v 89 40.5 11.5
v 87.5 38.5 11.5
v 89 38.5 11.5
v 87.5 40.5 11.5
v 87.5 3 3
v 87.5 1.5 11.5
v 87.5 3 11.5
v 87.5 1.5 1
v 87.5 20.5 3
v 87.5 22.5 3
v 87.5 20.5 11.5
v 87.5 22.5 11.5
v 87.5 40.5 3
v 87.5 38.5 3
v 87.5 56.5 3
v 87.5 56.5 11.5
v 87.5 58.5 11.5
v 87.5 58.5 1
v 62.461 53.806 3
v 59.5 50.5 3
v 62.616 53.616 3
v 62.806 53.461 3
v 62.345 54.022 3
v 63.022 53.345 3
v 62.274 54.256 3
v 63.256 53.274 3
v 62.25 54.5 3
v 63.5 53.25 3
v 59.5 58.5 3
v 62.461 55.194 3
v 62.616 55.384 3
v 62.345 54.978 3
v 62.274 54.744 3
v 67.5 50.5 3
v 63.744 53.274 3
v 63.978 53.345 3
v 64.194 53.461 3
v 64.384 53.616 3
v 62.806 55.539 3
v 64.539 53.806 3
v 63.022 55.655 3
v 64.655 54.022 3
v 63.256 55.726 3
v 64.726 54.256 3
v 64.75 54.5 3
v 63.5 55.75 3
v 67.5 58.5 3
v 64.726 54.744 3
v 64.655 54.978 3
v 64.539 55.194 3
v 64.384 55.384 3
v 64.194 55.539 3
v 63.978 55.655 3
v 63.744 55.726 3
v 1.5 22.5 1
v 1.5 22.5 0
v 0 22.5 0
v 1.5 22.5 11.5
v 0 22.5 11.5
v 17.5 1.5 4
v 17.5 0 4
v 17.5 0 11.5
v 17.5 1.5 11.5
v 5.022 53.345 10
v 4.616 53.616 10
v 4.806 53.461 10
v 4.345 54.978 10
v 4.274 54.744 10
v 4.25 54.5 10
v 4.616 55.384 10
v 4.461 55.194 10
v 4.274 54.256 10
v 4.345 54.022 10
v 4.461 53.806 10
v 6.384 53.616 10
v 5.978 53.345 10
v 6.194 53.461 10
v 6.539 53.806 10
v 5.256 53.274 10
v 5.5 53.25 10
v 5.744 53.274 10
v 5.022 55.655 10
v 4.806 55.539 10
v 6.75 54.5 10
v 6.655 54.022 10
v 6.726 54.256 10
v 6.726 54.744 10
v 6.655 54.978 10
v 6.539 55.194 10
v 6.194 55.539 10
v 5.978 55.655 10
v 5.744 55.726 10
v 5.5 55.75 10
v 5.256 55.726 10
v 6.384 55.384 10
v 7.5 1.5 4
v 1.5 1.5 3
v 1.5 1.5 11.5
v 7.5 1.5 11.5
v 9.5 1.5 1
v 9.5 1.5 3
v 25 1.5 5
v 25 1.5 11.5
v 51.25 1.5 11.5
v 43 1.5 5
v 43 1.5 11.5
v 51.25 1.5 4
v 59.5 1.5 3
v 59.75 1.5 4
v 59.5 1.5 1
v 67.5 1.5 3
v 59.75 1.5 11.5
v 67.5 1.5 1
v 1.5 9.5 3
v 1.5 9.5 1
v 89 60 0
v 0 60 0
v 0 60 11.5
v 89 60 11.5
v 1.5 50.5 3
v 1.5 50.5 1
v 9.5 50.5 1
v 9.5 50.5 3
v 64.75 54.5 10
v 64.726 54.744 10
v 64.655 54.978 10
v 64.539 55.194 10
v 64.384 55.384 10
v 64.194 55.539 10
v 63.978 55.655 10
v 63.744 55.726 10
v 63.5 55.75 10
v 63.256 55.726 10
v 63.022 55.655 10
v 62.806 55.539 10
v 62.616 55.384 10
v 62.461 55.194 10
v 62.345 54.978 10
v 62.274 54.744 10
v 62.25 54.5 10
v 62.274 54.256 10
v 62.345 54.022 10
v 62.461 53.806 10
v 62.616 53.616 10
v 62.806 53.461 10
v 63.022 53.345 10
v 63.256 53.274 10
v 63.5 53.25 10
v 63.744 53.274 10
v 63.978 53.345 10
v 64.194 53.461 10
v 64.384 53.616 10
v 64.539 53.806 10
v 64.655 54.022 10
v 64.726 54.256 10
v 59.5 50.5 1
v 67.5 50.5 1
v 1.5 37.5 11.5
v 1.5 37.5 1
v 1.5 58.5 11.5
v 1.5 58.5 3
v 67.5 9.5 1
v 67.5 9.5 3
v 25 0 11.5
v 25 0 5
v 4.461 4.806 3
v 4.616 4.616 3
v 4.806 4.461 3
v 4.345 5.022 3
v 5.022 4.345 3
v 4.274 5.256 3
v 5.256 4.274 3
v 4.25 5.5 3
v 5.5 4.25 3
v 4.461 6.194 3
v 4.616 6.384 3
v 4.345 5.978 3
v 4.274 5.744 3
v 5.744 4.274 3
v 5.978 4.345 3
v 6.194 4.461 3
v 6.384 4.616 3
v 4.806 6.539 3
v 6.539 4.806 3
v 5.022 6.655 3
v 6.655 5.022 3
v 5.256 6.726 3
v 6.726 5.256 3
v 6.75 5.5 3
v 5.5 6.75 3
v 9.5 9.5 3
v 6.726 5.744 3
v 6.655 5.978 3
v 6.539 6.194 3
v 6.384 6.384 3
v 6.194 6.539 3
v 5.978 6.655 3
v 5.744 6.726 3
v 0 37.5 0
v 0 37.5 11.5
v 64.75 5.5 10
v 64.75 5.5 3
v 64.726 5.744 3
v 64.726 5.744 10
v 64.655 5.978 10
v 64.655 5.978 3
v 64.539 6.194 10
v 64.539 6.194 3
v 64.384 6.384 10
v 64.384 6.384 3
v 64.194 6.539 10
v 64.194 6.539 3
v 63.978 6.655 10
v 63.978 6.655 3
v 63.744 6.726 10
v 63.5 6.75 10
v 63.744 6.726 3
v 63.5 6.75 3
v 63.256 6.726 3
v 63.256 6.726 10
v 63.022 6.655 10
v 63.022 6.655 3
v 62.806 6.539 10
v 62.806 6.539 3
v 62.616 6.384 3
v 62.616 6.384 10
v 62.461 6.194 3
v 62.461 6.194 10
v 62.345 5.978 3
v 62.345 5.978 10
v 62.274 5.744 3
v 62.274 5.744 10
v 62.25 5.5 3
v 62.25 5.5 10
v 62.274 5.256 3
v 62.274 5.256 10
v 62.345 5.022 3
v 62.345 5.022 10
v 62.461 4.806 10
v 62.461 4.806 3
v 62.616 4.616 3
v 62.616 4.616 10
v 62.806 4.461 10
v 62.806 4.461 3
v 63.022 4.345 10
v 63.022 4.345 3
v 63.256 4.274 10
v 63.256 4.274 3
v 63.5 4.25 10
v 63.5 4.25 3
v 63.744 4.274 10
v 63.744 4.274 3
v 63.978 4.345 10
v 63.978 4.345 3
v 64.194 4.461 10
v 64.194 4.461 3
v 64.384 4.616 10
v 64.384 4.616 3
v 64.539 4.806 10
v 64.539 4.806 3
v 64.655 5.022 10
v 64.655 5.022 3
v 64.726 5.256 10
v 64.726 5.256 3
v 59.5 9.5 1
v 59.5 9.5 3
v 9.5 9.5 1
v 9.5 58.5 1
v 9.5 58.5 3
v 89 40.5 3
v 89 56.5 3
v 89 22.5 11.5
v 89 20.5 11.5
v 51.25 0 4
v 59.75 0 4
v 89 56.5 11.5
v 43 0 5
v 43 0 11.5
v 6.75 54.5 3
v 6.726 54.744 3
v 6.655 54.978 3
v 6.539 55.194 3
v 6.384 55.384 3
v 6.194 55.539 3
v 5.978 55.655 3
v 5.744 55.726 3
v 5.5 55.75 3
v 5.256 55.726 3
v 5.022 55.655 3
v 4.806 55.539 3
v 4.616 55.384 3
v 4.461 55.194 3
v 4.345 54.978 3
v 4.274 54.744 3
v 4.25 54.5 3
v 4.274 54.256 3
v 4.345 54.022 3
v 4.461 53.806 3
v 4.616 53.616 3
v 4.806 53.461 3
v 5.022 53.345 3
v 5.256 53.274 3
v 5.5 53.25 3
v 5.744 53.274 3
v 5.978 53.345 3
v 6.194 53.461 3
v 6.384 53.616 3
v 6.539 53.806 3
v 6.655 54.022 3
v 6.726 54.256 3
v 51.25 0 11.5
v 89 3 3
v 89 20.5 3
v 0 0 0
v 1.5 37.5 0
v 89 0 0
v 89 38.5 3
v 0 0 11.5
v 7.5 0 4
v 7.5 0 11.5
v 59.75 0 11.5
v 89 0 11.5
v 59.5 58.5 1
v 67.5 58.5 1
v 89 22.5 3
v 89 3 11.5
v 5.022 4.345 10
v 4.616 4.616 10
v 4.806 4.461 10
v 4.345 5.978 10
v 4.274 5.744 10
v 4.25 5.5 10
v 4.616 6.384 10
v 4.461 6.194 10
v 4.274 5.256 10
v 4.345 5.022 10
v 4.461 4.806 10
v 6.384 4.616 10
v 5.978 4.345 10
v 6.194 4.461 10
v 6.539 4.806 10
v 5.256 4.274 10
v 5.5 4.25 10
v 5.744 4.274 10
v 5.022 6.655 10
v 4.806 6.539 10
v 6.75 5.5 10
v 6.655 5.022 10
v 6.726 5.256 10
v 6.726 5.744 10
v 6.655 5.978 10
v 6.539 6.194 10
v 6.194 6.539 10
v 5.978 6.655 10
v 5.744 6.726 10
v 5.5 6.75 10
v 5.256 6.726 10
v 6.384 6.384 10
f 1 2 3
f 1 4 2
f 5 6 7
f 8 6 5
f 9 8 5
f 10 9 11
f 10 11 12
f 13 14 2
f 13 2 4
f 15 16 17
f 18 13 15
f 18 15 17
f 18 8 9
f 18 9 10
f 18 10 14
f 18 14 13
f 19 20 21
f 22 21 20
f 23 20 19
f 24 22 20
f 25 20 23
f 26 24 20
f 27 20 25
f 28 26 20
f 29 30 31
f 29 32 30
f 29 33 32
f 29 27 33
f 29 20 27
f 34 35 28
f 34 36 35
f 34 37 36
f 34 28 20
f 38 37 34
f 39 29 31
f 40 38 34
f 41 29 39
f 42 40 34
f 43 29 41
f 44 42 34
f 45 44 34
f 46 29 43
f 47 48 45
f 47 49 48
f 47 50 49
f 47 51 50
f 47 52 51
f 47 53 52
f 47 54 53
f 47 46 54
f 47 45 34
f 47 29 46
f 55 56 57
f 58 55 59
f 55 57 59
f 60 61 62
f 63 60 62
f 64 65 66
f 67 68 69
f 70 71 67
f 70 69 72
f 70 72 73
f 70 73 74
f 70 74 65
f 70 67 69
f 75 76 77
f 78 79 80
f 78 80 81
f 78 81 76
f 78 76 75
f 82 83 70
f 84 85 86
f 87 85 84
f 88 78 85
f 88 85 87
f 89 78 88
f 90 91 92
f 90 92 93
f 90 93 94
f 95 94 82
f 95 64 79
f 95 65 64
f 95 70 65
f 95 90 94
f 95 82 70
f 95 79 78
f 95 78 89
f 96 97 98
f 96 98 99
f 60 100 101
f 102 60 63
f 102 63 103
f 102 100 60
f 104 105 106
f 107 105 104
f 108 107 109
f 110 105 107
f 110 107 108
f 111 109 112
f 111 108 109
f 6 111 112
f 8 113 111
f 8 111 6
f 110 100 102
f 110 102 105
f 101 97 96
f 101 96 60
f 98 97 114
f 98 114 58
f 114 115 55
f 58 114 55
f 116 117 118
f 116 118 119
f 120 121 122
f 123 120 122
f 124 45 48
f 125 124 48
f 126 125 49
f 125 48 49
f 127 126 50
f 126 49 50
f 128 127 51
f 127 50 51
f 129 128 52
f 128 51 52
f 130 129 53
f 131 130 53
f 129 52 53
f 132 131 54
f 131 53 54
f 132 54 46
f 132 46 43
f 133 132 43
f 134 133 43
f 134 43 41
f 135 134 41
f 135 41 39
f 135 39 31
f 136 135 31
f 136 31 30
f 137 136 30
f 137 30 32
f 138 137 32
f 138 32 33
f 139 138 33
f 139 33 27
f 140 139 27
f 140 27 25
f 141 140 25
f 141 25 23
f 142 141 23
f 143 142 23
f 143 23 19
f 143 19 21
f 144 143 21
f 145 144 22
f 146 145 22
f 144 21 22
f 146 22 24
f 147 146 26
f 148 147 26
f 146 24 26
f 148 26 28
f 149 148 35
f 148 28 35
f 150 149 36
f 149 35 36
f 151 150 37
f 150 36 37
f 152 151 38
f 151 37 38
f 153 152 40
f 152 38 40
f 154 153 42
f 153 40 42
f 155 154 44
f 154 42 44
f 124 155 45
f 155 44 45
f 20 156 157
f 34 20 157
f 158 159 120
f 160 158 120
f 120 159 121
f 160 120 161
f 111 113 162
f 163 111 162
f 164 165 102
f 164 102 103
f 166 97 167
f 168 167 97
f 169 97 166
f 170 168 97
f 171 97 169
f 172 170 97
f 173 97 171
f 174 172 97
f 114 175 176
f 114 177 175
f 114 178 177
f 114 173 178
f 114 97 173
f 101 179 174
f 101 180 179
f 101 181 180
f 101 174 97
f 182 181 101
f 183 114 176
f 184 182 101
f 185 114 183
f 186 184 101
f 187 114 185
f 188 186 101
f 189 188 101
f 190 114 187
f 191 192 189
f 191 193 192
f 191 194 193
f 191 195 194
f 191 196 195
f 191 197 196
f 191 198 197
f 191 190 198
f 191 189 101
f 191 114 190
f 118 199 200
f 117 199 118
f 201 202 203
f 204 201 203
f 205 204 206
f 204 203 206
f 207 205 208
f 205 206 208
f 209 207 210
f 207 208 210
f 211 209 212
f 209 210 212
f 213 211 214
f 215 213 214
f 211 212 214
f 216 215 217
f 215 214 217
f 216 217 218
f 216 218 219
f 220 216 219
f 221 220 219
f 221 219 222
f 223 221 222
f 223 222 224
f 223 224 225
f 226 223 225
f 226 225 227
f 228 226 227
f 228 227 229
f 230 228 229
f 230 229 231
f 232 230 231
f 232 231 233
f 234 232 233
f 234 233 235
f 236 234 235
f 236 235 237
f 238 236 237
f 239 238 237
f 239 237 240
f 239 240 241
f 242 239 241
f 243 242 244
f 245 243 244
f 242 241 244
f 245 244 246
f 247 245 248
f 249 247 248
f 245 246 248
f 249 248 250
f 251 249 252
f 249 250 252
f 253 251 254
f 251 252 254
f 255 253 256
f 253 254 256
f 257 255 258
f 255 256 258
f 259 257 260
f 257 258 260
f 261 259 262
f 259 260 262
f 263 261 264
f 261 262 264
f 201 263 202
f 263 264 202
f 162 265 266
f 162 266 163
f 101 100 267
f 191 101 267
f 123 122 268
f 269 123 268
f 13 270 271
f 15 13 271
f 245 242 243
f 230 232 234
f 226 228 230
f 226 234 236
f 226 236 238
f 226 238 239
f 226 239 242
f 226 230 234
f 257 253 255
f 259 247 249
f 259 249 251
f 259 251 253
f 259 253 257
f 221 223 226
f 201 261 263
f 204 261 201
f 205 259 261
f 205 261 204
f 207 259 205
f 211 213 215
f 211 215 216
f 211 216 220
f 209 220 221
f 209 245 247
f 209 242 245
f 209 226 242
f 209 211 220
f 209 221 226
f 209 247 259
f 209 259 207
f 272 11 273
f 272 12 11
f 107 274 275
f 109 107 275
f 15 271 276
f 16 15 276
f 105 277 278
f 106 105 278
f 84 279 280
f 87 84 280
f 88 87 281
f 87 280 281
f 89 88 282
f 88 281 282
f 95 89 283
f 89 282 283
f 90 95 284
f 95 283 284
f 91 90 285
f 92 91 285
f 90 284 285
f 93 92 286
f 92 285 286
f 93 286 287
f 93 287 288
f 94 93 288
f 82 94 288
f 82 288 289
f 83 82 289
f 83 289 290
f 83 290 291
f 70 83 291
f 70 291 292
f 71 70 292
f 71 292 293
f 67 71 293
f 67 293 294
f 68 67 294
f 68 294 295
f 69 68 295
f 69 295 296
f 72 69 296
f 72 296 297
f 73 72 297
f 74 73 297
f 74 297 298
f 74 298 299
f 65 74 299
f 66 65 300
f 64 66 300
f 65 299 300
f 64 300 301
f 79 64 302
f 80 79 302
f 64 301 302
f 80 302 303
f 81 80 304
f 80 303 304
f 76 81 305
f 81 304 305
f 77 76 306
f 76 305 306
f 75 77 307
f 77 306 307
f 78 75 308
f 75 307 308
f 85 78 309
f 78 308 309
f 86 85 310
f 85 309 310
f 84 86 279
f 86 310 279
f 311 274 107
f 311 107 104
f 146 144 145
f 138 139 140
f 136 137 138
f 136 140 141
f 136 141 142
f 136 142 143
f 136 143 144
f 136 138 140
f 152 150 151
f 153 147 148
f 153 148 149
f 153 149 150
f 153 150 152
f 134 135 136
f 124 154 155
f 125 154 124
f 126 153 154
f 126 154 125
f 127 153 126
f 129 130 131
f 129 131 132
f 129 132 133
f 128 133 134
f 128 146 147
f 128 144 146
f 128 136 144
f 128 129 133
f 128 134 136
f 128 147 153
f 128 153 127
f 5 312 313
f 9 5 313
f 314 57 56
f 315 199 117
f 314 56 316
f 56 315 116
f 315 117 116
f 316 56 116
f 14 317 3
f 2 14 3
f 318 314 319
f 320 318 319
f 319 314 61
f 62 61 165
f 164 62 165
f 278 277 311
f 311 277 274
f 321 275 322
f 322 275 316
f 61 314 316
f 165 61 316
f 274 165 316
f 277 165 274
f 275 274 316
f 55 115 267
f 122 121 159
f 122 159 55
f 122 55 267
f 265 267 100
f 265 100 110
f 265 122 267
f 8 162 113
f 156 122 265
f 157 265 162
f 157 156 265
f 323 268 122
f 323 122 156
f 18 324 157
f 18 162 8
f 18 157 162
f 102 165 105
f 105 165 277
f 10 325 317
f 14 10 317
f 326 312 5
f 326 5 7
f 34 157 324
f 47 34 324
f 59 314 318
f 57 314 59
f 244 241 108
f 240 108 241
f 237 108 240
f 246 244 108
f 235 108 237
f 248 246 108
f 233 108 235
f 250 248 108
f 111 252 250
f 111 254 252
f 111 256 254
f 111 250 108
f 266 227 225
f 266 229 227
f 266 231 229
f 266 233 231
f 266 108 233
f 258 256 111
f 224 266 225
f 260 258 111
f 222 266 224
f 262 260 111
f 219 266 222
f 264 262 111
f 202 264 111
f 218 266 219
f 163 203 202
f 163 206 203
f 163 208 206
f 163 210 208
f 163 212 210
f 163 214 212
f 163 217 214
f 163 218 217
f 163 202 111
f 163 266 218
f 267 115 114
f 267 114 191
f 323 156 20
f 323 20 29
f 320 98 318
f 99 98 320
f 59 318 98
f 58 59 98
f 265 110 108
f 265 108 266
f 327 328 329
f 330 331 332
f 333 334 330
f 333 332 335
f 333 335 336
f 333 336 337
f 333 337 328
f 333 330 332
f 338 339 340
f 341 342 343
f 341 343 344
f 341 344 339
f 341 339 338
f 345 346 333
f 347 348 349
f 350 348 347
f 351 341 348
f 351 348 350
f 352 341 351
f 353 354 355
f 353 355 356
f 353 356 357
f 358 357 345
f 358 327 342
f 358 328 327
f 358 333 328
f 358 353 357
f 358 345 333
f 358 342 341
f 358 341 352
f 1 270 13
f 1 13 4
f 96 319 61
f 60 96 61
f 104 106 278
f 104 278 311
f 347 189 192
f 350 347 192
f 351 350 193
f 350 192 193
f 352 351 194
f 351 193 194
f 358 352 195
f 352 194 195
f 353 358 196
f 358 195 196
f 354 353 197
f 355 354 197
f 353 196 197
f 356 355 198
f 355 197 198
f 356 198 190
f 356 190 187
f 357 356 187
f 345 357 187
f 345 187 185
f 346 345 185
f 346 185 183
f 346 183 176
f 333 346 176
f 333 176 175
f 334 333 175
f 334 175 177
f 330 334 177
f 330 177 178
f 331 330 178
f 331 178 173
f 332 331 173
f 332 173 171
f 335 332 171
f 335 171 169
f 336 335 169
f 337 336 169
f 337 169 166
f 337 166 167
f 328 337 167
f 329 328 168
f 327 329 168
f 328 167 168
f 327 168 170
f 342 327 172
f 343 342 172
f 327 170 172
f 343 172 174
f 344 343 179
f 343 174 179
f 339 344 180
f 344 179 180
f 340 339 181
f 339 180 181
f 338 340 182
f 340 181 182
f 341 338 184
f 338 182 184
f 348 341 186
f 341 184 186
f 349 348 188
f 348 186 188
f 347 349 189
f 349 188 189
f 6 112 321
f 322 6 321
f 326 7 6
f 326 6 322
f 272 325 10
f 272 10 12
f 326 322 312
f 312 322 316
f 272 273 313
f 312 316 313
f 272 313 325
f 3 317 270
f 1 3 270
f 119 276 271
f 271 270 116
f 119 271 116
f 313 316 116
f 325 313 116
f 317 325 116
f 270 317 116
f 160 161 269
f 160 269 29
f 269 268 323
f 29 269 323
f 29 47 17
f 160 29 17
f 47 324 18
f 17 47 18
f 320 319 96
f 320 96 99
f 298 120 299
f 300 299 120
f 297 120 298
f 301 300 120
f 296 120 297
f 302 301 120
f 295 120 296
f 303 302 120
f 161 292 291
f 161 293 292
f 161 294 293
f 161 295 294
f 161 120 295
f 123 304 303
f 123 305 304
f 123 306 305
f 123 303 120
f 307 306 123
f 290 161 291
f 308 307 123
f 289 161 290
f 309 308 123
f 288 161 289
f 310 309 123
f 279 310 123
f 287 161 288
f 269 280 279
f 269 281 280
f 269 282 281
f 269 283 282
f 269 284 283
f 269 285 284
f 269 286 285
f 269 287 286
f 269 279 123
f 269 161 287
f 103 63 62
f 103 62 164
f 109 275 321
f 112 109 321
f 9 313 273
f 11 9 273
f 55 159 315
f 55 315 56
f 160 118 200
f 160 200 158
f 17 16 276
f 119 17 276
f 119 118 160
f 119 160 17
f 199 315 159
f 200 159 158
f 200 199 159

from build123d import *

# Parameters (mm, degrees)
F0_W      = 89
F0_H      = 60
F1_DEPTH  = 1
F2_W      = 89
F2_H      = 60
F2_W_2    = 86
F2_H_2    = 57
F3_DEPTH  = 10.5
F4_W      = 15
F4_H      = 11.5
F5_DEPTH  = 1.5
F6_W      = 10
F6_H      = 7.5
F6_W_2    = 18
F6_H_2    = 6.5
F6_W_3    = 8.5
F7_DEPTH  = 1.5
F8_W      = 17.5
F8_H      = 8.5
F8_W_2    = 16
F9_DEPTH  = 1.5
F10_R     = 1.25
F11_DEPTH = 9
F12_W     = 8
F12_H     = 8
F12_R     = 1.25
F13_DEPTH = 2


with BuildPart() as f1:
    # F0 (on Top) → F1 (new body)
    with BuildSketch(Plane.XY):
        with Locations((44.5, 30)):
            Rectangle(F0_W, F0_H)
    extrude(amount=F1_DEPTH)

    # F2 (on face) → F3 (join)
    with BuildSketch(Plane.XY.offset(1)):
        with Locations((44.5, 30)):
            Rectangle(F2_W, F2_H)
        with Locations((44.5, 30)):
            Rectangle(F2_W_2, F2_H_2, mode=Mode.SUBTRACT)
    extrude(amount=F3_DEPTH)

    # F4 (on face) → F5 (cut, through all)
    with BuildSketch(Plane(origin=(0, 0, 0), x_dir=(0, -1, 0), z_dir=(-1, 0, 0))):
        with Locations((-30, 5.75)):
            Rectangle(F4_W, F4_H)
    extrude(amount=-F5_DEPTH, mode=Mode.SUBTRACT)

    # F6 (on face) → F7 (cut, through all)
    with BuildSketch(Plane.XZ):
        with Locations((12.5, 7.75)):
            Rectangle(F6_W, F6_H)
        with Locations((34, 8.25)):
            Rectangle(F6_W_2, F6_H_2)
        with Locations((55.5, 7.75)):
            Rectangle(F6_W_3, F6_H)
    extrude(amount=-F7_DEPTH, mode=Mode.SUBTRACT)

    # F8 (on face) → F9 (cut, through all)
    with BuildSketch(Plane.YZ.offset(89)):
        with Locations((11.75, 7.25)):
            Rectangle(F8_W, F8_H)
        with Locations((30.5, 7.25)):
            Rectangle(F8_W_2, F8_H)
        with Locations((48.5, 7.25)):
            Rectangle(F8_W_2, F8_H)
    extrude(amount=-F9_DEPTH, mode=Mode.SUBTRACT)

    # F10 (on face) → F11 (join)
    with BuildSketch(Plane.XY.offset(1)):
        with Locations((5.5, 54.5)):
            Circle(F10_R)
        with Locations((63.5, 54.5)):
            Circle(F10_R)
        with Locations((5.5, 5.5)):
            Circle(F10_R)
        with Locations((63.5, 5.5)):
            Circle(F10_R)
    extrude(amount=F11_DEPTH)

    # F12 (on face) → F13 (join)
    with BuildSketch(Plane.XY.offset(1)):
        with Locations((5.5, 54.5)):
            Rectangle(F12_W, F12_H)
        with Locations((5.5, 54.5)):
            Circle(F12_R, mode=Mode.SUBTRACT)
        with Locations((63.5, 54.5)):
            Rectangle(F12_W, F12_H)
        with Locations((63.5, 54.5)):
            Circle(F12_R, mode=Mode.SUBTRACT)
        with Locations((63.5, 5.5)):
            Rectangle(F12_W, F12_H)
        with Locations((63.5, 5.5)):
            Circle(F12_R, mode=Mode.SUBTRACT)
        with Locations((5.5, 5.5)):
            Rectangle(F12_W, F12_H)
        with Locations((5.5, 5.5)):
            Circle(F12_R, mode=Mode.SUBTRACT)
    extrude(amount=F13_DEPTH)


solid = f1.part
